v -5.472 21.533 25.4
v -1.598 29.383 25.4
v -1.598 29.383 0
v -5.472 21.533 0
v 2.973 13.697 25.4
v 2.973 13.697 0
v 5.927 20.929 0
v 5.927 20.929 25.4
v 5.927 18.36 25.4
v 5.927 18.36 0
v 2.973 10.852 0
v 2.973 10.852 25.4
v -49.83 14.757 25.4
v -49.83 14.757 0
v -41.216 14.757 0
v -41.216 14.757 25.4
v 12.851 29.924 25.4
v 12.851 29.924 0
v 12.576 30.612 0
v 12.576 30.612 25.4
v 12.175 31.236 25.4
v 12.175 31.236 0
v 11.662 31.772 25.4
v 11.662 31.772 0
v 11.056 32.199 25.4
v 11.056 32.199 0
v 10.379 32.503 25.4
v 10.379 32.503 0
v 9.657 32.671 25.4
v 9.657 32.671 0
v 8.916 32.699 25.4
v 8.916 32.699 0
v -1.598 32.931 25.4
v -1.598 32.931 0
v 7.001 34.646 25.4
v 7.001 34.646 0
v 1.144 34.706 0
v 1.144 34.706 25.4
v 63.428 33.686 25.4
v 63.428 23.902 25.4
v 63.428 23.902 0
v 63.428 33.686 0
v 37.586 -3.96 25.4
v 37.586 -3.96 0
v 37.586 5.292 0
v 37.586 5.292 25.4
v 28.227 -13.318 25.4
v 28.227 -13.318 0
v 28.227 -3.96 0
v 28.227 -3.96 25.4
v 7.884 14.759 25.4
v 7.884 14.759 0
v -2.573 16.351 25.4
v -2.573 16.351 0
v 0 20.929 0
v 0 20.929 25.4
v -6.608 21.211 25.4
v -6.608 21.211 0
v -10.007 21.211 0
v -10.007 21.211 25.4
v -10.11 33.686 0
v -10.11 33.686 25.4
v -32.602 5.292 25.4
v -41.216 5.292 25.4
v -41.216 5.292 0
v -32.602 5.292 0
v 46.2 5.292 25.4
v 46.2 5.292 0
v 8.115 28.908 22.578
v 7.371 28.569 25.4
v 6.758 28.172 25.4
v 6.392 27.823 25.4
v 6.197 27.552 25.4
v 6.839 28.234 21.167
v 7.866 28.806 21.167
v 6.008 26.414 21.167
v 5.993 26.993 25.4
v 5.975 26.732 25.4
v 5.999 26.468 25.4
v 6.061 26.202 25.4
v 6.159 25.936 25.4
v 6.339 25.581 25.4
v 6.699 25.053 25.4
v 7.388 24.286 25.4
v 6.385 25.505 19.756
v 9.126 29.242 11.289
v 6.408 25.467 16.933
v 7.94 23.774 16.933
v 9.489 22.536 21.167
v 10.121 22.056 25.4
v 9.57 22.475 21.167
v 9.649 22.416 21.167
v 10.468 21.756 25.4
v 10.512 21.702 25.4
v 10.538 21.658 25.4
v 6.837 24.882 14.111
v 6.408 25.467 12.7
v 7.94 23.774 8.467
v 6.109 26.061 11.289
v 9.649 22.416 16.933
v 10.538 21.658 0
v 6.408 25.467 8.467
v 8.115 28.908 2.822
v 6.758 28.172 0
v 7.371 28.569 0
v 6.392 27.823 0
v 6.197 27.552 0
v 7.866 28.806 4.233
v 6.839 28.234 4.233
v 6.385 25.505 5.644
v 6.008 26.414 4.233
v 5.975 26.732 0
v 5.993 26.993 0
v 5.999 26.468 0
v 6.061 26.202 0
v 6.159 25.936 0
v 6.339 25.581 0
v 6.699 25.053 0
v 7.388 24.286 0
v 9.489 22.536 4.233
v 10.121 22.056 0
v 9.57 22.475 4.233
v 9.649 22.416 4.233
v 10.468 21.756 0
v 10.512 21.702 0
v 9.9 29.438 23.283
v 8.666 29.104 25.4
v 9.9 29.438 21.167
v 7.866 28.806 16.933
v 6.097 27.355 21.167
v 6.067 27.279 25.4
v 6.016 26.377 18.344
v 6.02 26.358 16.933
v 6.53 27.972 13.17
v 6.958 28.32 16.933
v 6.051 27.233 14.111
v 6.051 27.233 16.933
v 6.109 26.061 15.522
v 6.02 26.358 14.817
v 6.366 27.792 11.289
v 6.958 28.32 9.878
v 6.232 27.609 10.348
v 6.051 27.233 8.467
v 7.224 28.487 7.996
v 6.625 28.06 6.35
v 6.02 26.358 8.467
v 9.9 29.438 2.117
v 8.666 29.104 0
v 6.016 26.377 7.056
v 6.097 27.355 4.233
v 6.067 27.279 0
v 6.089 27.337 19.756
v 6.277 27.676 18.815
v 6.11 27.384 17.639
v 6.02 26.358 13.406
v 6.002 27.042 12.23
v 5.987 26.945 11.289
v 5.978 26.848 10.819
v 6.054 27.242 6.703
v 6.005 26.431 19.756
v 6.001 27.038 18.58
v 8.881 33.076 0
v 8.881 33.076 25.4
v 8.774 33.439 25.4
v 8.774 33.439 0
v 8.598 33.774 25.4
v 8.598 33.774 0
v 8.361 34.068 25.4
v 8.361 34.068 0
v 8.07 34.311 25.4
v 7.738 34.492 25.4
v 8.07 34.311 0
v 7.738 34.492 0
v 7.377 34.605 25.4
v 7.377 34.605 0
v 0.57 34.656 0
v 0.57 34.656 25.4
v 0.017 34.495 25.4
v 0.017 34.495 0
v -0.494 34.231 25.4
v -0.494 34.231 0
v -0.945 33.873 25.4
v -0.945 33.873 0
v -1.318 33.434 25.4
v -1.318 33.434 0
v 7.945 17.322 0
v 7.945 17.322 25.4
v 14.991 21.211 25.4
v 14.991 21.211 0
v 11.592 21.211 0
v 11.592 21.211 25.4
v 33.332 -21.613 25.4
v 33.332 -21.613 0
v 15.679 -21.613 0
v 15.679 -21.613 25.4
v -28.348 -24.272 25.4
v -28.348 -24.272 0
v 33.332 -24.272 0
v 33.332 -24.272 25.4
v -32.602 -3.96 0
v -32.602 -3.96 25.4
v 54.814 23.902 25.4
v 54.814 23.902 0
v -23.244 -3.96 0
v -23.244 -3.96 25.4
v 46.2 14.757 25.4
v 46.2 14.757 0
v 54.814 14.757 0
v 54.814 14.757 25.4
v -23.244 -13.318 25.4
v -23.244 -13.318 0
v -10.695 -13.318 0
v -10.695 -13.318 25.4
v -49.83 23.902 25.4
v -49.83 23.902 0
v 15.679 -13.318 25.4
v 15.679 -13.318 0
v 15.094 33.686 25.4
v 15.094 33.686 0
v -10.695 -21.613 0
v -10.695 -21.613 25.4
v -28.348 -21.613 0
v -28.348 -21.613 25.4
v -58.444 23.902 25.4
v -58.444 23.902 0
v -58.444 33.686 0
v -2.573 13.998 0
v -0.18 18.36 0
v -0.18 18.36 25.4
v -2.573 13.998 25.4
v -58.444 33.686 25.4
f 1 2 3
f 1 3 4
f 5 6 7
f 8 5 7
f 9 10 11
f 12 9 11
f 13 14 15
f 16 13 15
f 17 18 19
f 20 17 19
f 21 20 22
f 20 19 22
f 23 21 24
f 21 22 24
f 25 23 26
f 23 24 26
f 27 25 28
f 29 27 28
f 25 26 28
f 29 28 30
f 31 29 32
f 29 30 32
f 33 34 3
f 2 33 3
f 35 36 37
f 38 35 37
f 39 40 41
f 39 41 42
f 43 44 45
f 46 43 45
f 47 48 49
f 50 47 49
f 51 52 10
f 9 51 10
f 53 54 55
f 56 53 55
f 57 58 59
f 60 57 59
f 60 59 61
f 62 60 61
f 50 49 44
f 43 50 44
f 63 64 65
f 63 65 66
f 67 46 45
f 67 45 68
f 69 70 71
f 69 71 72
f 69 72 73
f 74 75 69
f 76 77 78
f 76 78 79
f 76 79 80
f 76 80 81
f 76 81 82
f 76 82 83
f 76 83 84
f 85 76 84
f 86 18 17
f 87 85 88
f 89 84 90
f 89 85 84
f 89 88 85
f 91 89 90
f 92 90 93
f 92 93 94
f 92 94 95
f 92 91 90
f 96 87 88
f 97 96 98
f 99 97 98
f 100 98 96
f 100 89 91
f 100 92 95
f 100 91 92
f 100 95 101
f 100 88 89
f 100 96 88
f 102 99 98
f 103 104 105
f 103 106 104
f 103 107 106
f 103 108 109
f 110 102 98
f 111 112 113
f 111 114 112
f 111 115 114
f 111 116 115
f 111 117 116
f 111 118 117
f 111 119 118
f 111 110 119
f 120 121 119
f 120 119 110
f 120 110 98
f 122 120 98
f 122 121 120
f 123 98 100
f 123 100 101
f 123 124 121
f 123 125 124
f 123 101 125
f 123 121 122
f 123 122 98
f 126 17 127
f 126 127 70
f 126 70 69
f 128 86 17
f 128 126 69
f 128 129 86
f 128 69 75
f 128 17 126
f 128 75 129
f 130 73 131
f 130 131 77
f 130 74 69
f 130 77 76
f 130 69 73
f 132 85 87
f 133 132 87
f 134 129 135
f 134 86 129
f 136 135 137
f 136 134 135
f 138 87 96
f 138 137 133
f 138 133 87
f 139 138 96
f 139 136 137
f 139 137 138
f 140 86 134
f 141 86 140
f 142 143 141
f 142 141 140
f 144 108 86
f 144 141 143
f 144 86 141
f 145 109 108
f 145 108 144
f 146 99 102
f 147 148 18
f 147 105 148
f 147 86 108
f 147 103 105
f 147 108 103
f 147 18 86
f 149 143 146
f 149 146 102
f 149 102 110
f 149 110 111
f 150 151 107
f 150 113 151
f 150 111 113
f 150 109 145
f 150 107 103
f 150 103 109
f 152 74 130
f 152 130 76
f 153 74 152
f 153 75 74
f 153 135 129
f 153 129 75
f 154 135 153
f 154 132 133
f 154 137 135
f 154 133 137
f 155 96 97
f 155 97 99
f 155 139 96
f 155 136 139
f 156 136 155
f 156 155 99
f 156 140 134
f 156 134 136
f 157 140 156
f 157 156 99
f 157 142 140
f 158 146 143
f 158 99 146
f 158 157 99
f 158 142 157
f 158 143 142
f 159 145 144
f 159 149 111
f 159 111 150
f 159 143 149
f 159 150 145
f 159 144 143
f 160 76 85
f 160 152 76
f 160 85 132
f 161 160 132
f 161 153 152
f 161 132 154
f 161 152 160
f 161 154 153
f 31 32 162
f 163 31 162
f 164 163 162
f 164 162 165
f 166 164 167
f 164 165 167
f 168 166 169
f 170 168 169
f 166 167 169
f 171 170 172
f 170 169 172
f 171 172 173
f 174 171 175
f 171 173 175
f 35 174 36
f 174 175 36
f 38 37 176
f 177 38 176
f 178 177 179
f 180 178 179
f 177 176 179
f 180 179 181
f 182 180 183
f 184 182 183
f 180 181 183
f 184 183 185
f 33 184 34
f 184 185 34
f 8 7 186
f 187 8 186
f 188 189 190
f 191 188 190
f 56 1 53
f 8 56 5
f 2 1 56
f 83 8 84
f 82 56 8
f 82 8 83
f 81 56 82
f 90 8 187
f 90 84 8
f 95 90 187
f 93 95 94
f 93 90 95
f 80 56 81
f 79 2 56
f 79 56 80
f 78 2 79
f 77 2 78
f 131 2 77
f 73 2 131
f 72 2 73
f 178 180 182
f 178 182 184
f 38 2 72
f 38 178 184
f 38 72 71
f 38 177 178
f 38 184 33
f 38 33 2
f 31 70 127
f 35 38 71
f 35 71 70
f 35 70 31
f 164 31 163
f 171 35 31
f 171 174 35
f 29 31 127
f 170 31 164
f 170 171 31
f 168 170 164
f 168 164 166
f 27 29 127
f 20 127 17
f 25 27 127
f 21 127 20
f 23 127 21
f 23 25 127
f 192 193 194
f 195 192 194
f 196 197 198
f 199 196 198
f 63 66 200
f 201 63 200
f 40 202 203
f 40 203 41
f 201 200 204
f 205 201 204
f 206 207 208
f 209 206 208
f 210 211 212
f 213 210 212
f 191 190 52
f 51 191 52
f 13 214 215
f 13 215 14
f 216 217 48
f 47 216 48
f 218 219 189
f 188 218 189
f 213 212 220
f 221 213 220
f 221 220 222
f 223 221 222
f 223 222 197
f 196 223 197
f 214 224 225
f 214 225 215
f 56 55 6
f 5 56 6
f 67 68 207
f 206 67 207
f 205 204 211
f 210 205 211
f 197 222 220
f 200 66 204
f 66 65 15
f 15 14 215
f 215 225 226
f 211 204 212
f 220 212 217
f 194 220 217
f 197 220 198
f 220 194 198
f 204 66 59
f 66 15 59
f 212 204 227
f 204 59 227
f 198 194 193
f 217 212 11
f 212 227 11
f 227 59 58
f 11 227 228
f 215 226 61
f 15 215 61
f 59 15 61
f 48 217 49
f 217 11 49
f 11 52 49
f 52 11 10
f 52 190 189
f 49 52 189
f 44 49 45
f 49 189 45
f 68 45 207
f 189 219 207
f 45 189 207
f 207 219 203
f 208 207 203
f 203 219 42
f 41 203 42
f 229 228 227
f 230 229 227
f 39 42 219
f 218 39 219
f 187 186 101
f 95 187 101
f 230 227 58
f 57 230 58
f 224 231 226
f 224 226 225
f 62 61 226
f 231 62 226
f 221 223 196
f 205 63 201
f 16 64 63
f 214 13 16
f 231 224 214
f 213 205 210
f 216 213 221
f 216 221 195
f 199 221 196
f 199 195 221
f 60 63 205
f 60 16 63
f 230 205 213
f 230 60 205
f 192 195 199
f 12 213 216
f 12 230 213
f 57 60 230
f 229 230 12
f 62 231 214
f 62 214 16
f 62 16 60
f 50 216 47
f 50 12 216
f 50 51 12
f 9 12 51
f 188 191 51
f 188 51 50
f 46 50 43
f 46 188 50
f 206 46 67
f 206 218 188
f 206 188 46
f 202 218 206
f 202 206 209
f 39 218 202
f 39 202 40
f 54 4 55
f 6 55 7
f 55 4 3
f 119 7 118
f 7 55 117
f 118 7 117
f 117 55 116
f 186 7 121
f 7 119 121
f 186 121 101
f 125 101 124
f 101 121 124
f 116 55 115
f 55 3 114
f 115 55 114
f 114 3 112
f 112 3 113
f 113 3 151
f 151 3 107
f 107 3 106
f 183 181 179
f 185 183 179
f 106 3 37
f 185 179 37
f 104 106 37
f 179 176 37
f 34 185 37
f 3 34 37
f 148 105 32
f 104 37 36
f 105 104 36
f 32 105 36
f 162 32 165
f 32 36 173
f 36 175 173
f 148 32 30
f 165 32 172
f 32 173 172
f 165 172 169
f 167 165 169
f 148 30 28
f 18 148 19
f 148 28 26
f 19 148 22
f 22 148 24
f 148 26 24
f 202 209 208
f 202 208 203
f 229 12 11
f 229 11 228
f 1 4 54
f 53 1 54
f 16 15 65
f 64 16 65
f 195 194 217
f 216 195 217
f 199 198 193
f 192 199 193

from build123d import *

# Parameters (mm, degrees)
F1_DEPTH = 25.4


with BuildPart() as f1:
    # F0 (on Top) → F1 (new body)
    with BuildSketch(Plane.XY):
        Polygon((-28.348306, -21.61333), (-28.348306, -24.271959), (33.331875, -24.271959), (33.331875, -21.61333), (15.678583, -21.61333), (15.678583, -13.318409), (28.227307, -13.318409), (28.227307, -3.960037), (37.585679, -3.960037), (37.585679, 5.29199), (46.199635, 5.29199), (46.199635, 14.756707), (54.813597, 14.756707), (54.813597, 23.90239), (63.427553, 23.90239), (63.427553, 33.686142), (15.093687, 33.686142), (14.990575, 21.210903), (11.591747, 21.210903), (7.884043, 14.758617), (5.926916, 18.360477), (2.973495, 10.852472), (-0.180228, 18.360477), (-2.572729, 13.997681), (-6.608179, 21.210903), (-10.007006, 21.210903), (-10.110118, 33.686142), (-58.443984, 33.686142), (-58.443984, 23.90239), (-49.830029, 23.90239), (-49.830029, 14.756707), (-41.216066, 14.756707), (-41.216066, 5.29199), (-32.602111, 5.29199), (-32.602111, -3.960037), (-23.243738, -3.960037), (-23.243738, -13.318409), (-10.695014, -13.318409), (-10.695014, -21.61333), align=None)
        with BuildLine():
            Line((-5.471667, 21.532604), (-2.572729, 16.350856))
            Line((-2.572729, 16.350856), (0, 20.928543))
            Line((0, 20.928543), (2.973495, 13.697124))
            Line((2.973495, 13.697124), (5.926916, 20.928543))
            Line((5.926916, 20.928543), (7.944845, 17.321566))
            Line((7.944845, 17.321566), (10.537774, 21.658318))
            add(Edge.make_bspline(
                [(12.850831, 29.9235), (-0.952655, 28.321544), (10.24423, 22.397771), (10.537774, 21.658318)],
                knots=[0, 0, 0, 0, 8.582743, 8.582743, 8.582743, 8.582743], degree=3))
            ThreePointArc((12.850831, 29.9235), (11.369118, 31.999958), (8.915832, 32.698912))
            ThreePointArc((8.915832, 32.698912), (8.360585, 34.067975), (7.000977, 34.645989))
            Line((7.000977, 34.645989), (1.144173, 34.705877))
            ThreePointArc((1.144173, 34.705877), (-0.494247, 34.230998), (-1.598421, 32.930717))
            Line((-1.598421, 32.930717), (-1.598421, 29.382924))
            Line((-1.598421, 29.382924), (-5.471667, 21.532604))
        make_face()
    extrude(amount=F1_DEPTH)


solid = f1.part
